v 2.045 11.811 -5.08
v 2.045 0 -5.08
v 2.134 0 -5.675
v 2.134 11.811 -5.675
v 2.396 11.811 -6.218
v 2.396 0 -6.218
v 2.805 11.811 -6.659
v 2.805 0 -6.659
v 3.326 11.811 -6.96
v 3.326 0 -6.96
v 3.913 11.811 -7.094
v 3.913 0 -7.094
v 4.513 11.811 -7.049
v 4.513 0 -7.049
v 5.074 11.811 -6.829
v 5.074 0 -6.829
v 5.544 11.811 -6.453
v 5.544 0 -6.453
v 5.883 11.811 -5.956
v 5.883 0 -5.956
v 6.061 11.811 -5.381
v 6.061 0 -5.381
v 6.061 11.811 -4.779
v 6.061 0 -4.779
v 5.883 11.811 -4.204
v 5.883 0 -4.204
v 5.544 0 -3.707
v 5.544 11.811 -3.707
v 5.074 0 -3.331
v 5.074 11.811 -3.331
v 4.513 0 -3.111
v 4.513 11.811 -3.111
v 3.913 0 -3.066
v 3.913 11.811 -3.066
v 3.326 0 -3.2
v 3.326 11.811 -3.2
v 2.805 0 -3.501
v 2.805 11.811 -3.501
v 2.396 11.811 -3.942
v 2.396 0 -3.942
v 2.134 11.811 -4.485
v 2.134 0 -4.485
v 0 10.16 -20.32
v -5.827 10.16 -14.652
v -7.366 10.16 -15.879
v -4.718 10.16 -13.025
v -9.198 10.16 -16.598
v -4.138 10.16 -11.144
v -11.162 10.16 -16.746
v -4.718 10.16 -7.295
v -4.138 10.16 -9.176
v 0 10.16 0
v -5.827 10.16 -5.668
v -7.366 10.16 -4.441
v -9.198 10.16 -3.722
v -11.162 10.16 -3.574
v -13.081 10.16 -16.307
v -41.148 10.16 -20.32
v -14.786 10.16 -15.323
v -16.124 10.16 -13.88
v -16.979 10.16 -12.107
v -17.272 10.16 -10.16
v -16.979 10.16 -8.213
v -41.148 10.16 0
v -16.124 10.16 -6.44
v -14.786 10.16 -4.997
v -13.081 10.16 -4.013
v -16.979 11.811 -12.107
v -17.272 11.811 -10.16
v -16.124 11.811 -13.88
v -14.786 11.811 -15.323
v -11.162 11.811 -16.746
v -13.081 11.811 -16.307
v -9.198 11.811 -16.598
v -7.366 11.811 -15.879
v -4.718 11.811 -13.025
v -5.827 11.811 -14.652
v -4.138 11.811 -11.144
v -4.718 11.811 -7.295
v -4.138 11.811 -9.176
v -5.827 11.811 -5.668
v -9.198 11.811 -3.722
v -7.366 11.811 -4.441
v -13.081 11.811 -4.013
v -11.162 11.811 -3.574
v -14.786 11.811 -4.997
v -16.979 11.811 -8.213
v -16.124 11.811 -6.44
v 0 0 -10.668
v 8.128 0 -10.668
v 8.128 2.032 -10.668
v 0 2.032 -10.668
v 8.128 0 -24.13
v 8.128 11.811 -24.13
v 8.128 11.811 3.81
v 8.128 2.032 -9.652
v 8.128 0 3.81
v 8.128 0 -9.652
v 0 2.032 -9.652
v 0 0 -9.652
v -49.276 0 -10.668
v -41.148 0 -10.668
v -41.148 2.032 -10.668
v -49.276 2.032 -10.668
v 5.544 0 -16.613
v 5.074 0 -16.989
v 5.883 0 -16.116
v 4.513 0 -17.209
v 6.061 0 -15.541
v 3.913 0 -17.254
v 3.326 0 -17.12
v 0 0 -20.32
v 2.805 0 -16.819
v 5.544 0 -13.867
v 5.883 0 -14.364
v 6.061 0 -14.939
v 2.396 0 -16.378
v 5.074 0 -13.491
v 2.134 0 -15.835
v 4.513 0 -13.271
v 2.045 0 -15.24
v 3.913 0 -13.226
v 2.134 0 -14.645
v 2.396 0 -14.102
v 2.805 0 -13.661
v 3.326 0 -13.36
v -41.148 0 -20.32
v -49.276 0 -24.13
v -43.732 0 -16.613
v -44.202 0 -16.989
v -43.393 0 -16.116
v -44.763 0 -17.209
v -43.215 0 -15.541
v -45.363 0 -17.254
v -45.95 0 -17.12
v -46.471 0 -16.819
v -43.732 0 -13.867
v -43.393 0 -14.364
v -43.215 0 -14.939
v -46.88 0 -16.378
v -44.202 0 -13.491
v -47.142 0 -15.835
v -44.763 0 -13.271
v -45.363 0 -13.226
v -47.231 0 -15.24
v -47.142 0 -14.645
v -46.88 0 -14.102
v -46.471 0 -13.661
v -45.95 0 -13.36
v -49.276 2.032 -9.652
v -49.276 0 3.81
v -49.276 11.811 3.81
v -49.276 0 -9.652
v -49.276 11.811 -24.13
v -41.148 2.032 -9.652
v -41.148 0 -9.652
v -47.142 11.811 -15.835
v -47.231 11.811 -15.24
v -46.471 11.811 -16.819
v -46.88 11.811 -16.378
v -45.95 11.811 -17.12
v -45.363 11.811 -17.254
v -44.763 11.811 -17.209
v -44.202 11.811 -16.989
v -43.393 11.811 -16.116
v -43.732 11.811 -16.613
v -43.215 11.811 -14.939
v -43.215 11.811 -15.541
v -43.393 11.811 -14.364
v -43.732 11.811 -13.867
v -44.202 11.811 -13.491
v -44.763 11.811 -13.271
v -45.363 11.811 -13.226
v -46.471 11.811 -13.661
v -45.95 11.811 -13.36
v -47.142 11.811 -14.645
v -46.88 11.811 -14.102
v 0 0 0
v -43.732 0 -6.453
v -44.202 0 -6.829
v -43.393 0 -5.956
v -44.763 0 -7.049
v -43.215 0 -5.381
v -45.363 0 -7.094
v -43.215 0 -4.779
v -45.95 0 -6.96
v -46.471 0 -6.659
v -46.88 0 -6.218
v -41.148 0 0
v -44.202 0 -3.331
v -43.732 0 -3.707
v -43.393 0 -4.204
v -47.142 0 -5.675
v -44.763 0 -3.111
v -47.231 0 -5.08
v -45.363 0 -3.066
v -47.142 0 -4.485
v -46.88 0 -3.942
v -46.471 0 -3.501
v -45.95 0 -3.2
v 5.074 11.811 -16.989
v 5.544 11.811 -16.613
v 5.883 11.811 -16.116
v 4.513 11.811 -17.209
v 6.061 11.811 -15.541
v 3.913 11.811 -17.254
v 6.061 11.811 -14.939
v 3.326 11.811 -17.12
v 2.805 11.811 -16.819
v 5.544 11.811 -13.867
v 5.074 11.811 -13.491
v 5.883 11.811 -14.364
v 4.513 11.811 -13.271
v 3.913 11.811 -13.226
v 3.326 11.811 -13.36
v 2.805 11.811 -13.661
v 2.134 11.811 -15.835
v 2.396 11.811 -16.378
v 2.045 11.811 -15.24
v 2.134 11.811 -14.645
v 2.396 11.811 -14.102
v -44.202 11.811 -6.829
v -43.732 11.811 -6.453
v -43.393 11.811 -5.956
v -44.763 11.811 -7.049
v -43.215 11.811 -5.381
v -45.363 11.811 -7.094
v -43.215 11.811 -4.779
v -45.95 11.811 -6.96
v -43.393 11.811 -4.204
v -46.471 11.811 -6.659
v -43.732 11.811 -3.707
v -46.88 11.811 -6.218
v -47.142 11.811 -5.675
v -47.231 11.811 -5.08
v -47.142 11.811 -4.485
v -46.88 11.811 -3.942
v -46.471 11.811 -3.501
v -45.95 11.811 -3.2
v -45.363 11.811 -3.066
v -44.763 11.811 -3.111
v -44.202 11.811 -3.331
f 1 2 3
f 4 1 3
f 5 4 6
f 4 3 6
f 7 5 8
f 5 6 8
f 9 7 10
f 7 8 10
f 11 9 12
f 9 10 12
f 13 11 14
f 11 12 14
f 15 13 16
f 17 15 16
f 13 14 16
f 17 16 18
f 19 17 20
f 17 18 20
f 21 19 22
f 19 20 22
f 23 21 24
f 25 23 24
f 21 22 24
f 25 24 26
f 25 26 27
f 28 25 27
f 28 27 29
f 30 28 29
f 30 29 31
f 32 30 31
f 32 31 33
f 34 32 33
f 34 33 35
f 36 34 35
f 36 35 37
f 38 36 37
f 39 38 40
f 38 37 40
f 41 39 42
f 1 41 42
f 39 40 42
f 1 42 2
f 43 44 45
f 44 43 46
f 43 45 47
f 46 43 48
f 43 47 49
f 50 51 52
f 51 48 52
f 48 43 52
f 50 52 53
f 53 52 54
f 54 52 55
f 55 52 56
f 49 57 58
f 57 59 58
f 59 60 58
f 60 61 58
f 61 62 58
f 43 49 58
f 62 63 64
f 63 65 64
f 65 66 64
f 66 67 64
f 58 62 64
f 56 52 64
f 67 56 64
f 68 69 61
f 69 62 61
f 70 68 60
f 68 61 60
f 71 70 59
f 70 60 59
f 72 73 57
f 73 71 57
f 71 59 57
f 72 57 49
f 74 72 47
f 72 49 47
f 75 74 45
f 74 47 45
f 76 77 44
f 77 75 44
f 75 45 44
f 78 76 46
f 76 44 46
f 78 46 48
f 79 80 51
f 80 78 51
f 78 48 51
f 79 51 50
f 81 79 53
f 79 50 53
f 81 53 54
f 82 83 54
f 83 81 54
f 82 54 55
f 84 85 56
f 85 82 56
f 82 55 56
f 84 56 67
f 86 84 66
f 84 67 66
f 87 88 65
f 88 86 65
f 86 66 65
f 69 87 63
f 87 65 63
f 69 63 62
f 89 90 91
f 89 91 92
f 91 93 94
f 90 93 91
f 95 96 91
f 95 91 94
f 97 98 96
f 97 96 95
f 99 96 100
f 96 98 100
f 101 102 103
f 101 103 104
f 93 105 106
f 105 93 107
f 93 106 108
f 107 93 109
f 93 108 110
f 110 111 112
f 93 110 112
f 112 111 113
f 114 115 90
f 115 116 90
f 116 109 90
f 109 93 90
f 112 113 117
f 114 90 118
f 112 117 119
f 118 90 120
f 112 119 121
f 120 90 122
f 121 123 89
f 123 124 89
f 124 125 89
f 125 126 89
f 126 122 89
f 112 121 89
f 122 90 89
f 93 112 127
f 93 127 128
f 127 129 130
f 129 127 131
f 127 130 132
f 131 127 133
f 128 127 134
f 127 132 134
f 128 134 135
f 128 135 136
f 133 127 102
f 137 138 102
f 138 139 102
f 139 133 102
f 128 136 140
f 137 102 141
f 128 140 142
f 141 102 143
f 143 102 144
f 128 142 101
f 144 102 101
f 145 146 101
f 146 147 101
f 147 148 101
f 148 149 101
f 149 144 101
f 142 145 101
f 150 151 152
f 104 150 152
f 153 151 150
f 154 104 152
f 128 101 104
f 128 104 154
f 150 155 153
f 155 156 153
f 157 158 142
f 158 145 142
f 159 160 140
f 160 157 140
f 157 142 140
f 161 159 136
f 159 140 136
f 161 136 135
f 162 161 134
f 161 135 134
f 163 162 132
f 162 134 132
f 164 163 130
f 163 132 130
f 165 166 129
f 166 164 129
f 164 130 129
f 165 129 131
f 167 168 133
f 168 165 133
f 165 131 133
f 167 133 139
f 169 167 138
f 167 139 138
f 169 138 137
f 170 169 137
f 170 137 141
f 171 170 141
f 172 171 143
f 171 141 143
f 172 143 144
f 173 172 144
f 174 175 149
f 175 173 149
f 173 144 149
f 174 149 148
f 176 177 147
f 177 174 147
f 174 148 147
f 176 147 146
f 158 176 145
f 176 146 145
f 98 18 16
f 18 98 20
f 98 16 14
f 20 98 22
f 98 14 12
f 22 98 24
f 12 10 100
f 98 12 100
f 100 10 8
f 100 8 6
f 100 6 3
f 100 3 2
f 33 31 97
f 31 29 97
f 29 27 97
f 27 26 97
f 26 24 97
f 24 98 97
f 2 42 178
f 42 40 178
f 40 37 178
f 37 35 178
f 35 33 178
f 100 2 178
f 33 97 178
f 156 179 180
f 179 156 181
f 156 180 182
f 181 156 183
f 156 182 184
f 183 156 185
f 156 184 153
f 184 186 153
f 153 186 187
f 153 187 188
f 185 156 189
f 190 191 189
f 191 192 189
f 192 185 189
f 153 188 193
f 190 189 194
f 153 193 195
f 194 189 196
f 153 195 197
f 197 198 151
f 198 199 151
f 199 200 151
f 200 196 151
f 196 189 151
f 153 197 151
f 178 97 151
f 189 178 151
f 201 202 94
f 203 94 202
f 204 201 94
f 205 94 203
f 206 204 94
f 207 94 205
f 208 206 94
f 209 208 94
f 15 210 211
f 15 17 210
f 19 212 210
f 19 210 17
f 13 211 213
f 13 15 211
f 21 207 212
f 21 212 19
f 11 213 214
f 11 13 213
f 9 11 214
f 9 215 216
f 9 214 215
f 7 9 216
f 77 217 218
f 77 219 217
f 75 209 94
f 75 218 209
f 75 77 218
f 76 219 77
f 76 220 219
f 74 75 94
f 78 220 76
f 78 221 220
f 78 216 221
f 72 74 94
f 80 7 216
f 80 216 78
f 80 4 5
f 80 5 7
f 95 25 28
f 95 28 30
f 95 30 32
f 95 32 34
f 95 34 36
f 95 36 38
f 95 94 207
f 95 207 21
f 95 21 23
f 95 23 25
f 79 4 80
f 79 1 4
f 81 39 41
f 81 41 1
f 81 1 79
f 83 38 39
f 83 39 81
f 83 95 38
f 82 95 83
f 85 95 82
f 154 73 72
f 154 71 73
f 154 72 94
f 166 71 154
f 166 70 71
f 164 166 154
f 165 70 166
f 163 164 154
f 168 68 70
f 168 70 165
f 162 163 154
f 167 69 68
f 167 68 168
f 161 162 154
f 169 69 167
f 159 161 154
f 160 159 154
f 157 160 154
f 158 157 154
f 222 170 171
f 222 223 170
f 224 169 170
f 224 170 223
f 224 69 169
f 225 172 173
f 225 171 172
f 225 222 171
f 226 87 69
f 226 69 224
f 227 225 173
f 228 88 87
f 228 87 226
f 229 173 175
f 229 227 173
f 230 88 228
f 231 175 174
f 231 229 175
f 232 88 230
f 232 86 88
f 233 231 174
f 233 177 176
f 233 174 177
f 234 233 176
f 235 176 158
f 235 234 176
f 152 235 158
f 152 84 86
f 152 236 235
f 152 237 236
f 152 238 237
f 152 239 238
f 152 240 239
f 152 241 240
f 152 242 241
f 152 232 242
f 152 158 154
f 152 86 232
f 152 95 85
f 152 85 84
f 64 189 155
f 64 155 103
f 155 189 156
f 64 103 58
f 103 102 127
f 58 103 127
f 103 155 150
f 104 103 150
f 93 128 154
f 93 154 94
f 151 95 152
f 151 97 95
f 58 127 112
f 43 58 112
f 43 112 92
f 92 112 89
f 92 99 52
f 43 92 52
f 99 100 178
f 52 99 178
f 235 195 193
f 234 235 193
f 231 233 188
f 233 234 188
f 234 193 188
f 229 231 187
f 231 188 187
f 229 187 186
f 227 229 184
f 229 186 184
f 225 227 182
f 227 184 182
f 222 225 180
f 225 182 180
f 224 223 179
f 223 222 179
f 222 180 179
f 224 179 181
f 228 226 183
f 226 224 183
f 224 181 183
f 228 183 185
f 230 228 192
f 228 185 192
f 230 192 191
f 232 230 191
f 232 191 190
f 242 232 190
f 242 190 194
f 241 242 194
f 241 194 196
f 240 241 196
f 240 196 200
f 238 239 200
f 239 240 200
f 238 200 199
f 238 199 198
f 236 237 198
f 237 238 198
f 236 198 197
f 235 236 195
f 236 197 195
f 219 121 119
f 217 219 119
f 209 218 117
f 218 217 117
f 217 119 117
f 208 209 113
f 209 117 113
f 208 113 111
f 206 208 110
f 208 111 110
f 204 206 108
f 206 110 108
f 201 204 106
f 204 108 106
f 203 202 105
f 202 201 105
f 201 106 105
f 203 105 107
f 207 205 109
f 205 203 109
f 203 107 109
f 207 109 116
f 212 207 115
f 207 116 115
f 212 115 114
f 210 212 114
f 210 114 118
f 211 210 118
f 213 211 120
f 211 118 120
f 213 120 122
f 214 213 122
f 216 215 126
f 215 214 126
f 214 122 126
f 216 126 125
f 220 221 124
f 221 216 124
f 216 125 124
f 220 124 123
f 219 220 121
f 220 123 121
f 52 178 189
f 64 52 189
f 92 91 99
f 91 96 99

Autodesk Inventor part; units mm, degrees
ref_plane "YZ Plane" through (0, 0, 0) normal (1, 0, 0) x (0, 1, 0)
ref_plane "XZ Plane" through (0, 0, 0) normal (0, 1, 0) x (-1, 0, 0)
ref_plane "XY Plane" through (0, 0, 0) normal (0, 0, 1) x (1, 0, 0)
sketch "Sketch1" plane through (0, 0, 0) normal (0, 1, 0) x (-1, 0, 0)
  line L0 (0, 0) -> (41.148, 0)
  line L1 (41.148, 0) -> (41.148, -20.32)
  line L2 (41.148, -20.32) -> (0, -20.32)
  line L3 (0, -20.32) -> (0, 0)
  circle A0 centre (45.212, -15.24) radius 2.0193
  circle A1 centre (-4.064, -15.24) radius 2.0193
  circle A2 centre (45.212, -5.08) radius 2.0193
  circle A3 centre (-4.064, -5.08) radius 2.0193
  line L4 (41.148, -9.652) -> (49.276, -9.652)
  line L5 (41.148, -10.668) -> (49.276, -10.668)
  line L6 (-8.128, -9.652) -> (0, -9.652)
  line L7 (-8.128, -10.668) -> (0, -10.668)
  line L8 (-8.128, 3.81) -> (49.276, 3.81)
  line L9 (49.276, 3.81) -> (49.276, -24.13)
  line L10 (49.276, -24.13) -> (-8.128, -24.13)
  line L11 (-8.128, -24.13) -> (-8.128, 3.81)
  line L12 (-6.155, -5.4575) -> (-6.0508, -5.4409)
  line L13 (-6.155, -5.4575) -> (-6.0508, -5.4409)
  line L14 (20.574, -20.32) -> (20.574, 0)
  line L15 (-38.8148, -33.5345) -> (54.3929, -33.5345)
  line L16 (-38.8148, 13.2145) -> (52.2934, 13.2145)
  circle A4 centre (10.668, -10.16) radius 6.604
  point P0 (20.574, -10.16)
  dimension "d0" = 41.148
  dimension "d1" = 20.32
  dimension "d4" = 4.0386
  dimension "d5" = 4.0386
  dimension "d18" = 4.064
  dimension "d19" = 4.064
  dimension "d52" = 8.128
  dimension "d53" = 8.128
  dimension "d54" = 3.81
  dimension "d55" = 3.81
  dimension "d59" = 9.906
  dimension "d60" = 13.208
extrude "Extrusion10" add sketch "Sketch1" along normal blind 11.811
extrude "Extrusion11" cut sketch "Sketch1" along normal blind 10.16 contours L0 L14 L2 L3 | L0 L1 L2 L14
extrude "Extrusion12" cut sketch "Sketch1" along normal blind 2.032 contours L3 L7 L11 L6 | L4 L9 L5 L1
properties part number "Servo Mount"
